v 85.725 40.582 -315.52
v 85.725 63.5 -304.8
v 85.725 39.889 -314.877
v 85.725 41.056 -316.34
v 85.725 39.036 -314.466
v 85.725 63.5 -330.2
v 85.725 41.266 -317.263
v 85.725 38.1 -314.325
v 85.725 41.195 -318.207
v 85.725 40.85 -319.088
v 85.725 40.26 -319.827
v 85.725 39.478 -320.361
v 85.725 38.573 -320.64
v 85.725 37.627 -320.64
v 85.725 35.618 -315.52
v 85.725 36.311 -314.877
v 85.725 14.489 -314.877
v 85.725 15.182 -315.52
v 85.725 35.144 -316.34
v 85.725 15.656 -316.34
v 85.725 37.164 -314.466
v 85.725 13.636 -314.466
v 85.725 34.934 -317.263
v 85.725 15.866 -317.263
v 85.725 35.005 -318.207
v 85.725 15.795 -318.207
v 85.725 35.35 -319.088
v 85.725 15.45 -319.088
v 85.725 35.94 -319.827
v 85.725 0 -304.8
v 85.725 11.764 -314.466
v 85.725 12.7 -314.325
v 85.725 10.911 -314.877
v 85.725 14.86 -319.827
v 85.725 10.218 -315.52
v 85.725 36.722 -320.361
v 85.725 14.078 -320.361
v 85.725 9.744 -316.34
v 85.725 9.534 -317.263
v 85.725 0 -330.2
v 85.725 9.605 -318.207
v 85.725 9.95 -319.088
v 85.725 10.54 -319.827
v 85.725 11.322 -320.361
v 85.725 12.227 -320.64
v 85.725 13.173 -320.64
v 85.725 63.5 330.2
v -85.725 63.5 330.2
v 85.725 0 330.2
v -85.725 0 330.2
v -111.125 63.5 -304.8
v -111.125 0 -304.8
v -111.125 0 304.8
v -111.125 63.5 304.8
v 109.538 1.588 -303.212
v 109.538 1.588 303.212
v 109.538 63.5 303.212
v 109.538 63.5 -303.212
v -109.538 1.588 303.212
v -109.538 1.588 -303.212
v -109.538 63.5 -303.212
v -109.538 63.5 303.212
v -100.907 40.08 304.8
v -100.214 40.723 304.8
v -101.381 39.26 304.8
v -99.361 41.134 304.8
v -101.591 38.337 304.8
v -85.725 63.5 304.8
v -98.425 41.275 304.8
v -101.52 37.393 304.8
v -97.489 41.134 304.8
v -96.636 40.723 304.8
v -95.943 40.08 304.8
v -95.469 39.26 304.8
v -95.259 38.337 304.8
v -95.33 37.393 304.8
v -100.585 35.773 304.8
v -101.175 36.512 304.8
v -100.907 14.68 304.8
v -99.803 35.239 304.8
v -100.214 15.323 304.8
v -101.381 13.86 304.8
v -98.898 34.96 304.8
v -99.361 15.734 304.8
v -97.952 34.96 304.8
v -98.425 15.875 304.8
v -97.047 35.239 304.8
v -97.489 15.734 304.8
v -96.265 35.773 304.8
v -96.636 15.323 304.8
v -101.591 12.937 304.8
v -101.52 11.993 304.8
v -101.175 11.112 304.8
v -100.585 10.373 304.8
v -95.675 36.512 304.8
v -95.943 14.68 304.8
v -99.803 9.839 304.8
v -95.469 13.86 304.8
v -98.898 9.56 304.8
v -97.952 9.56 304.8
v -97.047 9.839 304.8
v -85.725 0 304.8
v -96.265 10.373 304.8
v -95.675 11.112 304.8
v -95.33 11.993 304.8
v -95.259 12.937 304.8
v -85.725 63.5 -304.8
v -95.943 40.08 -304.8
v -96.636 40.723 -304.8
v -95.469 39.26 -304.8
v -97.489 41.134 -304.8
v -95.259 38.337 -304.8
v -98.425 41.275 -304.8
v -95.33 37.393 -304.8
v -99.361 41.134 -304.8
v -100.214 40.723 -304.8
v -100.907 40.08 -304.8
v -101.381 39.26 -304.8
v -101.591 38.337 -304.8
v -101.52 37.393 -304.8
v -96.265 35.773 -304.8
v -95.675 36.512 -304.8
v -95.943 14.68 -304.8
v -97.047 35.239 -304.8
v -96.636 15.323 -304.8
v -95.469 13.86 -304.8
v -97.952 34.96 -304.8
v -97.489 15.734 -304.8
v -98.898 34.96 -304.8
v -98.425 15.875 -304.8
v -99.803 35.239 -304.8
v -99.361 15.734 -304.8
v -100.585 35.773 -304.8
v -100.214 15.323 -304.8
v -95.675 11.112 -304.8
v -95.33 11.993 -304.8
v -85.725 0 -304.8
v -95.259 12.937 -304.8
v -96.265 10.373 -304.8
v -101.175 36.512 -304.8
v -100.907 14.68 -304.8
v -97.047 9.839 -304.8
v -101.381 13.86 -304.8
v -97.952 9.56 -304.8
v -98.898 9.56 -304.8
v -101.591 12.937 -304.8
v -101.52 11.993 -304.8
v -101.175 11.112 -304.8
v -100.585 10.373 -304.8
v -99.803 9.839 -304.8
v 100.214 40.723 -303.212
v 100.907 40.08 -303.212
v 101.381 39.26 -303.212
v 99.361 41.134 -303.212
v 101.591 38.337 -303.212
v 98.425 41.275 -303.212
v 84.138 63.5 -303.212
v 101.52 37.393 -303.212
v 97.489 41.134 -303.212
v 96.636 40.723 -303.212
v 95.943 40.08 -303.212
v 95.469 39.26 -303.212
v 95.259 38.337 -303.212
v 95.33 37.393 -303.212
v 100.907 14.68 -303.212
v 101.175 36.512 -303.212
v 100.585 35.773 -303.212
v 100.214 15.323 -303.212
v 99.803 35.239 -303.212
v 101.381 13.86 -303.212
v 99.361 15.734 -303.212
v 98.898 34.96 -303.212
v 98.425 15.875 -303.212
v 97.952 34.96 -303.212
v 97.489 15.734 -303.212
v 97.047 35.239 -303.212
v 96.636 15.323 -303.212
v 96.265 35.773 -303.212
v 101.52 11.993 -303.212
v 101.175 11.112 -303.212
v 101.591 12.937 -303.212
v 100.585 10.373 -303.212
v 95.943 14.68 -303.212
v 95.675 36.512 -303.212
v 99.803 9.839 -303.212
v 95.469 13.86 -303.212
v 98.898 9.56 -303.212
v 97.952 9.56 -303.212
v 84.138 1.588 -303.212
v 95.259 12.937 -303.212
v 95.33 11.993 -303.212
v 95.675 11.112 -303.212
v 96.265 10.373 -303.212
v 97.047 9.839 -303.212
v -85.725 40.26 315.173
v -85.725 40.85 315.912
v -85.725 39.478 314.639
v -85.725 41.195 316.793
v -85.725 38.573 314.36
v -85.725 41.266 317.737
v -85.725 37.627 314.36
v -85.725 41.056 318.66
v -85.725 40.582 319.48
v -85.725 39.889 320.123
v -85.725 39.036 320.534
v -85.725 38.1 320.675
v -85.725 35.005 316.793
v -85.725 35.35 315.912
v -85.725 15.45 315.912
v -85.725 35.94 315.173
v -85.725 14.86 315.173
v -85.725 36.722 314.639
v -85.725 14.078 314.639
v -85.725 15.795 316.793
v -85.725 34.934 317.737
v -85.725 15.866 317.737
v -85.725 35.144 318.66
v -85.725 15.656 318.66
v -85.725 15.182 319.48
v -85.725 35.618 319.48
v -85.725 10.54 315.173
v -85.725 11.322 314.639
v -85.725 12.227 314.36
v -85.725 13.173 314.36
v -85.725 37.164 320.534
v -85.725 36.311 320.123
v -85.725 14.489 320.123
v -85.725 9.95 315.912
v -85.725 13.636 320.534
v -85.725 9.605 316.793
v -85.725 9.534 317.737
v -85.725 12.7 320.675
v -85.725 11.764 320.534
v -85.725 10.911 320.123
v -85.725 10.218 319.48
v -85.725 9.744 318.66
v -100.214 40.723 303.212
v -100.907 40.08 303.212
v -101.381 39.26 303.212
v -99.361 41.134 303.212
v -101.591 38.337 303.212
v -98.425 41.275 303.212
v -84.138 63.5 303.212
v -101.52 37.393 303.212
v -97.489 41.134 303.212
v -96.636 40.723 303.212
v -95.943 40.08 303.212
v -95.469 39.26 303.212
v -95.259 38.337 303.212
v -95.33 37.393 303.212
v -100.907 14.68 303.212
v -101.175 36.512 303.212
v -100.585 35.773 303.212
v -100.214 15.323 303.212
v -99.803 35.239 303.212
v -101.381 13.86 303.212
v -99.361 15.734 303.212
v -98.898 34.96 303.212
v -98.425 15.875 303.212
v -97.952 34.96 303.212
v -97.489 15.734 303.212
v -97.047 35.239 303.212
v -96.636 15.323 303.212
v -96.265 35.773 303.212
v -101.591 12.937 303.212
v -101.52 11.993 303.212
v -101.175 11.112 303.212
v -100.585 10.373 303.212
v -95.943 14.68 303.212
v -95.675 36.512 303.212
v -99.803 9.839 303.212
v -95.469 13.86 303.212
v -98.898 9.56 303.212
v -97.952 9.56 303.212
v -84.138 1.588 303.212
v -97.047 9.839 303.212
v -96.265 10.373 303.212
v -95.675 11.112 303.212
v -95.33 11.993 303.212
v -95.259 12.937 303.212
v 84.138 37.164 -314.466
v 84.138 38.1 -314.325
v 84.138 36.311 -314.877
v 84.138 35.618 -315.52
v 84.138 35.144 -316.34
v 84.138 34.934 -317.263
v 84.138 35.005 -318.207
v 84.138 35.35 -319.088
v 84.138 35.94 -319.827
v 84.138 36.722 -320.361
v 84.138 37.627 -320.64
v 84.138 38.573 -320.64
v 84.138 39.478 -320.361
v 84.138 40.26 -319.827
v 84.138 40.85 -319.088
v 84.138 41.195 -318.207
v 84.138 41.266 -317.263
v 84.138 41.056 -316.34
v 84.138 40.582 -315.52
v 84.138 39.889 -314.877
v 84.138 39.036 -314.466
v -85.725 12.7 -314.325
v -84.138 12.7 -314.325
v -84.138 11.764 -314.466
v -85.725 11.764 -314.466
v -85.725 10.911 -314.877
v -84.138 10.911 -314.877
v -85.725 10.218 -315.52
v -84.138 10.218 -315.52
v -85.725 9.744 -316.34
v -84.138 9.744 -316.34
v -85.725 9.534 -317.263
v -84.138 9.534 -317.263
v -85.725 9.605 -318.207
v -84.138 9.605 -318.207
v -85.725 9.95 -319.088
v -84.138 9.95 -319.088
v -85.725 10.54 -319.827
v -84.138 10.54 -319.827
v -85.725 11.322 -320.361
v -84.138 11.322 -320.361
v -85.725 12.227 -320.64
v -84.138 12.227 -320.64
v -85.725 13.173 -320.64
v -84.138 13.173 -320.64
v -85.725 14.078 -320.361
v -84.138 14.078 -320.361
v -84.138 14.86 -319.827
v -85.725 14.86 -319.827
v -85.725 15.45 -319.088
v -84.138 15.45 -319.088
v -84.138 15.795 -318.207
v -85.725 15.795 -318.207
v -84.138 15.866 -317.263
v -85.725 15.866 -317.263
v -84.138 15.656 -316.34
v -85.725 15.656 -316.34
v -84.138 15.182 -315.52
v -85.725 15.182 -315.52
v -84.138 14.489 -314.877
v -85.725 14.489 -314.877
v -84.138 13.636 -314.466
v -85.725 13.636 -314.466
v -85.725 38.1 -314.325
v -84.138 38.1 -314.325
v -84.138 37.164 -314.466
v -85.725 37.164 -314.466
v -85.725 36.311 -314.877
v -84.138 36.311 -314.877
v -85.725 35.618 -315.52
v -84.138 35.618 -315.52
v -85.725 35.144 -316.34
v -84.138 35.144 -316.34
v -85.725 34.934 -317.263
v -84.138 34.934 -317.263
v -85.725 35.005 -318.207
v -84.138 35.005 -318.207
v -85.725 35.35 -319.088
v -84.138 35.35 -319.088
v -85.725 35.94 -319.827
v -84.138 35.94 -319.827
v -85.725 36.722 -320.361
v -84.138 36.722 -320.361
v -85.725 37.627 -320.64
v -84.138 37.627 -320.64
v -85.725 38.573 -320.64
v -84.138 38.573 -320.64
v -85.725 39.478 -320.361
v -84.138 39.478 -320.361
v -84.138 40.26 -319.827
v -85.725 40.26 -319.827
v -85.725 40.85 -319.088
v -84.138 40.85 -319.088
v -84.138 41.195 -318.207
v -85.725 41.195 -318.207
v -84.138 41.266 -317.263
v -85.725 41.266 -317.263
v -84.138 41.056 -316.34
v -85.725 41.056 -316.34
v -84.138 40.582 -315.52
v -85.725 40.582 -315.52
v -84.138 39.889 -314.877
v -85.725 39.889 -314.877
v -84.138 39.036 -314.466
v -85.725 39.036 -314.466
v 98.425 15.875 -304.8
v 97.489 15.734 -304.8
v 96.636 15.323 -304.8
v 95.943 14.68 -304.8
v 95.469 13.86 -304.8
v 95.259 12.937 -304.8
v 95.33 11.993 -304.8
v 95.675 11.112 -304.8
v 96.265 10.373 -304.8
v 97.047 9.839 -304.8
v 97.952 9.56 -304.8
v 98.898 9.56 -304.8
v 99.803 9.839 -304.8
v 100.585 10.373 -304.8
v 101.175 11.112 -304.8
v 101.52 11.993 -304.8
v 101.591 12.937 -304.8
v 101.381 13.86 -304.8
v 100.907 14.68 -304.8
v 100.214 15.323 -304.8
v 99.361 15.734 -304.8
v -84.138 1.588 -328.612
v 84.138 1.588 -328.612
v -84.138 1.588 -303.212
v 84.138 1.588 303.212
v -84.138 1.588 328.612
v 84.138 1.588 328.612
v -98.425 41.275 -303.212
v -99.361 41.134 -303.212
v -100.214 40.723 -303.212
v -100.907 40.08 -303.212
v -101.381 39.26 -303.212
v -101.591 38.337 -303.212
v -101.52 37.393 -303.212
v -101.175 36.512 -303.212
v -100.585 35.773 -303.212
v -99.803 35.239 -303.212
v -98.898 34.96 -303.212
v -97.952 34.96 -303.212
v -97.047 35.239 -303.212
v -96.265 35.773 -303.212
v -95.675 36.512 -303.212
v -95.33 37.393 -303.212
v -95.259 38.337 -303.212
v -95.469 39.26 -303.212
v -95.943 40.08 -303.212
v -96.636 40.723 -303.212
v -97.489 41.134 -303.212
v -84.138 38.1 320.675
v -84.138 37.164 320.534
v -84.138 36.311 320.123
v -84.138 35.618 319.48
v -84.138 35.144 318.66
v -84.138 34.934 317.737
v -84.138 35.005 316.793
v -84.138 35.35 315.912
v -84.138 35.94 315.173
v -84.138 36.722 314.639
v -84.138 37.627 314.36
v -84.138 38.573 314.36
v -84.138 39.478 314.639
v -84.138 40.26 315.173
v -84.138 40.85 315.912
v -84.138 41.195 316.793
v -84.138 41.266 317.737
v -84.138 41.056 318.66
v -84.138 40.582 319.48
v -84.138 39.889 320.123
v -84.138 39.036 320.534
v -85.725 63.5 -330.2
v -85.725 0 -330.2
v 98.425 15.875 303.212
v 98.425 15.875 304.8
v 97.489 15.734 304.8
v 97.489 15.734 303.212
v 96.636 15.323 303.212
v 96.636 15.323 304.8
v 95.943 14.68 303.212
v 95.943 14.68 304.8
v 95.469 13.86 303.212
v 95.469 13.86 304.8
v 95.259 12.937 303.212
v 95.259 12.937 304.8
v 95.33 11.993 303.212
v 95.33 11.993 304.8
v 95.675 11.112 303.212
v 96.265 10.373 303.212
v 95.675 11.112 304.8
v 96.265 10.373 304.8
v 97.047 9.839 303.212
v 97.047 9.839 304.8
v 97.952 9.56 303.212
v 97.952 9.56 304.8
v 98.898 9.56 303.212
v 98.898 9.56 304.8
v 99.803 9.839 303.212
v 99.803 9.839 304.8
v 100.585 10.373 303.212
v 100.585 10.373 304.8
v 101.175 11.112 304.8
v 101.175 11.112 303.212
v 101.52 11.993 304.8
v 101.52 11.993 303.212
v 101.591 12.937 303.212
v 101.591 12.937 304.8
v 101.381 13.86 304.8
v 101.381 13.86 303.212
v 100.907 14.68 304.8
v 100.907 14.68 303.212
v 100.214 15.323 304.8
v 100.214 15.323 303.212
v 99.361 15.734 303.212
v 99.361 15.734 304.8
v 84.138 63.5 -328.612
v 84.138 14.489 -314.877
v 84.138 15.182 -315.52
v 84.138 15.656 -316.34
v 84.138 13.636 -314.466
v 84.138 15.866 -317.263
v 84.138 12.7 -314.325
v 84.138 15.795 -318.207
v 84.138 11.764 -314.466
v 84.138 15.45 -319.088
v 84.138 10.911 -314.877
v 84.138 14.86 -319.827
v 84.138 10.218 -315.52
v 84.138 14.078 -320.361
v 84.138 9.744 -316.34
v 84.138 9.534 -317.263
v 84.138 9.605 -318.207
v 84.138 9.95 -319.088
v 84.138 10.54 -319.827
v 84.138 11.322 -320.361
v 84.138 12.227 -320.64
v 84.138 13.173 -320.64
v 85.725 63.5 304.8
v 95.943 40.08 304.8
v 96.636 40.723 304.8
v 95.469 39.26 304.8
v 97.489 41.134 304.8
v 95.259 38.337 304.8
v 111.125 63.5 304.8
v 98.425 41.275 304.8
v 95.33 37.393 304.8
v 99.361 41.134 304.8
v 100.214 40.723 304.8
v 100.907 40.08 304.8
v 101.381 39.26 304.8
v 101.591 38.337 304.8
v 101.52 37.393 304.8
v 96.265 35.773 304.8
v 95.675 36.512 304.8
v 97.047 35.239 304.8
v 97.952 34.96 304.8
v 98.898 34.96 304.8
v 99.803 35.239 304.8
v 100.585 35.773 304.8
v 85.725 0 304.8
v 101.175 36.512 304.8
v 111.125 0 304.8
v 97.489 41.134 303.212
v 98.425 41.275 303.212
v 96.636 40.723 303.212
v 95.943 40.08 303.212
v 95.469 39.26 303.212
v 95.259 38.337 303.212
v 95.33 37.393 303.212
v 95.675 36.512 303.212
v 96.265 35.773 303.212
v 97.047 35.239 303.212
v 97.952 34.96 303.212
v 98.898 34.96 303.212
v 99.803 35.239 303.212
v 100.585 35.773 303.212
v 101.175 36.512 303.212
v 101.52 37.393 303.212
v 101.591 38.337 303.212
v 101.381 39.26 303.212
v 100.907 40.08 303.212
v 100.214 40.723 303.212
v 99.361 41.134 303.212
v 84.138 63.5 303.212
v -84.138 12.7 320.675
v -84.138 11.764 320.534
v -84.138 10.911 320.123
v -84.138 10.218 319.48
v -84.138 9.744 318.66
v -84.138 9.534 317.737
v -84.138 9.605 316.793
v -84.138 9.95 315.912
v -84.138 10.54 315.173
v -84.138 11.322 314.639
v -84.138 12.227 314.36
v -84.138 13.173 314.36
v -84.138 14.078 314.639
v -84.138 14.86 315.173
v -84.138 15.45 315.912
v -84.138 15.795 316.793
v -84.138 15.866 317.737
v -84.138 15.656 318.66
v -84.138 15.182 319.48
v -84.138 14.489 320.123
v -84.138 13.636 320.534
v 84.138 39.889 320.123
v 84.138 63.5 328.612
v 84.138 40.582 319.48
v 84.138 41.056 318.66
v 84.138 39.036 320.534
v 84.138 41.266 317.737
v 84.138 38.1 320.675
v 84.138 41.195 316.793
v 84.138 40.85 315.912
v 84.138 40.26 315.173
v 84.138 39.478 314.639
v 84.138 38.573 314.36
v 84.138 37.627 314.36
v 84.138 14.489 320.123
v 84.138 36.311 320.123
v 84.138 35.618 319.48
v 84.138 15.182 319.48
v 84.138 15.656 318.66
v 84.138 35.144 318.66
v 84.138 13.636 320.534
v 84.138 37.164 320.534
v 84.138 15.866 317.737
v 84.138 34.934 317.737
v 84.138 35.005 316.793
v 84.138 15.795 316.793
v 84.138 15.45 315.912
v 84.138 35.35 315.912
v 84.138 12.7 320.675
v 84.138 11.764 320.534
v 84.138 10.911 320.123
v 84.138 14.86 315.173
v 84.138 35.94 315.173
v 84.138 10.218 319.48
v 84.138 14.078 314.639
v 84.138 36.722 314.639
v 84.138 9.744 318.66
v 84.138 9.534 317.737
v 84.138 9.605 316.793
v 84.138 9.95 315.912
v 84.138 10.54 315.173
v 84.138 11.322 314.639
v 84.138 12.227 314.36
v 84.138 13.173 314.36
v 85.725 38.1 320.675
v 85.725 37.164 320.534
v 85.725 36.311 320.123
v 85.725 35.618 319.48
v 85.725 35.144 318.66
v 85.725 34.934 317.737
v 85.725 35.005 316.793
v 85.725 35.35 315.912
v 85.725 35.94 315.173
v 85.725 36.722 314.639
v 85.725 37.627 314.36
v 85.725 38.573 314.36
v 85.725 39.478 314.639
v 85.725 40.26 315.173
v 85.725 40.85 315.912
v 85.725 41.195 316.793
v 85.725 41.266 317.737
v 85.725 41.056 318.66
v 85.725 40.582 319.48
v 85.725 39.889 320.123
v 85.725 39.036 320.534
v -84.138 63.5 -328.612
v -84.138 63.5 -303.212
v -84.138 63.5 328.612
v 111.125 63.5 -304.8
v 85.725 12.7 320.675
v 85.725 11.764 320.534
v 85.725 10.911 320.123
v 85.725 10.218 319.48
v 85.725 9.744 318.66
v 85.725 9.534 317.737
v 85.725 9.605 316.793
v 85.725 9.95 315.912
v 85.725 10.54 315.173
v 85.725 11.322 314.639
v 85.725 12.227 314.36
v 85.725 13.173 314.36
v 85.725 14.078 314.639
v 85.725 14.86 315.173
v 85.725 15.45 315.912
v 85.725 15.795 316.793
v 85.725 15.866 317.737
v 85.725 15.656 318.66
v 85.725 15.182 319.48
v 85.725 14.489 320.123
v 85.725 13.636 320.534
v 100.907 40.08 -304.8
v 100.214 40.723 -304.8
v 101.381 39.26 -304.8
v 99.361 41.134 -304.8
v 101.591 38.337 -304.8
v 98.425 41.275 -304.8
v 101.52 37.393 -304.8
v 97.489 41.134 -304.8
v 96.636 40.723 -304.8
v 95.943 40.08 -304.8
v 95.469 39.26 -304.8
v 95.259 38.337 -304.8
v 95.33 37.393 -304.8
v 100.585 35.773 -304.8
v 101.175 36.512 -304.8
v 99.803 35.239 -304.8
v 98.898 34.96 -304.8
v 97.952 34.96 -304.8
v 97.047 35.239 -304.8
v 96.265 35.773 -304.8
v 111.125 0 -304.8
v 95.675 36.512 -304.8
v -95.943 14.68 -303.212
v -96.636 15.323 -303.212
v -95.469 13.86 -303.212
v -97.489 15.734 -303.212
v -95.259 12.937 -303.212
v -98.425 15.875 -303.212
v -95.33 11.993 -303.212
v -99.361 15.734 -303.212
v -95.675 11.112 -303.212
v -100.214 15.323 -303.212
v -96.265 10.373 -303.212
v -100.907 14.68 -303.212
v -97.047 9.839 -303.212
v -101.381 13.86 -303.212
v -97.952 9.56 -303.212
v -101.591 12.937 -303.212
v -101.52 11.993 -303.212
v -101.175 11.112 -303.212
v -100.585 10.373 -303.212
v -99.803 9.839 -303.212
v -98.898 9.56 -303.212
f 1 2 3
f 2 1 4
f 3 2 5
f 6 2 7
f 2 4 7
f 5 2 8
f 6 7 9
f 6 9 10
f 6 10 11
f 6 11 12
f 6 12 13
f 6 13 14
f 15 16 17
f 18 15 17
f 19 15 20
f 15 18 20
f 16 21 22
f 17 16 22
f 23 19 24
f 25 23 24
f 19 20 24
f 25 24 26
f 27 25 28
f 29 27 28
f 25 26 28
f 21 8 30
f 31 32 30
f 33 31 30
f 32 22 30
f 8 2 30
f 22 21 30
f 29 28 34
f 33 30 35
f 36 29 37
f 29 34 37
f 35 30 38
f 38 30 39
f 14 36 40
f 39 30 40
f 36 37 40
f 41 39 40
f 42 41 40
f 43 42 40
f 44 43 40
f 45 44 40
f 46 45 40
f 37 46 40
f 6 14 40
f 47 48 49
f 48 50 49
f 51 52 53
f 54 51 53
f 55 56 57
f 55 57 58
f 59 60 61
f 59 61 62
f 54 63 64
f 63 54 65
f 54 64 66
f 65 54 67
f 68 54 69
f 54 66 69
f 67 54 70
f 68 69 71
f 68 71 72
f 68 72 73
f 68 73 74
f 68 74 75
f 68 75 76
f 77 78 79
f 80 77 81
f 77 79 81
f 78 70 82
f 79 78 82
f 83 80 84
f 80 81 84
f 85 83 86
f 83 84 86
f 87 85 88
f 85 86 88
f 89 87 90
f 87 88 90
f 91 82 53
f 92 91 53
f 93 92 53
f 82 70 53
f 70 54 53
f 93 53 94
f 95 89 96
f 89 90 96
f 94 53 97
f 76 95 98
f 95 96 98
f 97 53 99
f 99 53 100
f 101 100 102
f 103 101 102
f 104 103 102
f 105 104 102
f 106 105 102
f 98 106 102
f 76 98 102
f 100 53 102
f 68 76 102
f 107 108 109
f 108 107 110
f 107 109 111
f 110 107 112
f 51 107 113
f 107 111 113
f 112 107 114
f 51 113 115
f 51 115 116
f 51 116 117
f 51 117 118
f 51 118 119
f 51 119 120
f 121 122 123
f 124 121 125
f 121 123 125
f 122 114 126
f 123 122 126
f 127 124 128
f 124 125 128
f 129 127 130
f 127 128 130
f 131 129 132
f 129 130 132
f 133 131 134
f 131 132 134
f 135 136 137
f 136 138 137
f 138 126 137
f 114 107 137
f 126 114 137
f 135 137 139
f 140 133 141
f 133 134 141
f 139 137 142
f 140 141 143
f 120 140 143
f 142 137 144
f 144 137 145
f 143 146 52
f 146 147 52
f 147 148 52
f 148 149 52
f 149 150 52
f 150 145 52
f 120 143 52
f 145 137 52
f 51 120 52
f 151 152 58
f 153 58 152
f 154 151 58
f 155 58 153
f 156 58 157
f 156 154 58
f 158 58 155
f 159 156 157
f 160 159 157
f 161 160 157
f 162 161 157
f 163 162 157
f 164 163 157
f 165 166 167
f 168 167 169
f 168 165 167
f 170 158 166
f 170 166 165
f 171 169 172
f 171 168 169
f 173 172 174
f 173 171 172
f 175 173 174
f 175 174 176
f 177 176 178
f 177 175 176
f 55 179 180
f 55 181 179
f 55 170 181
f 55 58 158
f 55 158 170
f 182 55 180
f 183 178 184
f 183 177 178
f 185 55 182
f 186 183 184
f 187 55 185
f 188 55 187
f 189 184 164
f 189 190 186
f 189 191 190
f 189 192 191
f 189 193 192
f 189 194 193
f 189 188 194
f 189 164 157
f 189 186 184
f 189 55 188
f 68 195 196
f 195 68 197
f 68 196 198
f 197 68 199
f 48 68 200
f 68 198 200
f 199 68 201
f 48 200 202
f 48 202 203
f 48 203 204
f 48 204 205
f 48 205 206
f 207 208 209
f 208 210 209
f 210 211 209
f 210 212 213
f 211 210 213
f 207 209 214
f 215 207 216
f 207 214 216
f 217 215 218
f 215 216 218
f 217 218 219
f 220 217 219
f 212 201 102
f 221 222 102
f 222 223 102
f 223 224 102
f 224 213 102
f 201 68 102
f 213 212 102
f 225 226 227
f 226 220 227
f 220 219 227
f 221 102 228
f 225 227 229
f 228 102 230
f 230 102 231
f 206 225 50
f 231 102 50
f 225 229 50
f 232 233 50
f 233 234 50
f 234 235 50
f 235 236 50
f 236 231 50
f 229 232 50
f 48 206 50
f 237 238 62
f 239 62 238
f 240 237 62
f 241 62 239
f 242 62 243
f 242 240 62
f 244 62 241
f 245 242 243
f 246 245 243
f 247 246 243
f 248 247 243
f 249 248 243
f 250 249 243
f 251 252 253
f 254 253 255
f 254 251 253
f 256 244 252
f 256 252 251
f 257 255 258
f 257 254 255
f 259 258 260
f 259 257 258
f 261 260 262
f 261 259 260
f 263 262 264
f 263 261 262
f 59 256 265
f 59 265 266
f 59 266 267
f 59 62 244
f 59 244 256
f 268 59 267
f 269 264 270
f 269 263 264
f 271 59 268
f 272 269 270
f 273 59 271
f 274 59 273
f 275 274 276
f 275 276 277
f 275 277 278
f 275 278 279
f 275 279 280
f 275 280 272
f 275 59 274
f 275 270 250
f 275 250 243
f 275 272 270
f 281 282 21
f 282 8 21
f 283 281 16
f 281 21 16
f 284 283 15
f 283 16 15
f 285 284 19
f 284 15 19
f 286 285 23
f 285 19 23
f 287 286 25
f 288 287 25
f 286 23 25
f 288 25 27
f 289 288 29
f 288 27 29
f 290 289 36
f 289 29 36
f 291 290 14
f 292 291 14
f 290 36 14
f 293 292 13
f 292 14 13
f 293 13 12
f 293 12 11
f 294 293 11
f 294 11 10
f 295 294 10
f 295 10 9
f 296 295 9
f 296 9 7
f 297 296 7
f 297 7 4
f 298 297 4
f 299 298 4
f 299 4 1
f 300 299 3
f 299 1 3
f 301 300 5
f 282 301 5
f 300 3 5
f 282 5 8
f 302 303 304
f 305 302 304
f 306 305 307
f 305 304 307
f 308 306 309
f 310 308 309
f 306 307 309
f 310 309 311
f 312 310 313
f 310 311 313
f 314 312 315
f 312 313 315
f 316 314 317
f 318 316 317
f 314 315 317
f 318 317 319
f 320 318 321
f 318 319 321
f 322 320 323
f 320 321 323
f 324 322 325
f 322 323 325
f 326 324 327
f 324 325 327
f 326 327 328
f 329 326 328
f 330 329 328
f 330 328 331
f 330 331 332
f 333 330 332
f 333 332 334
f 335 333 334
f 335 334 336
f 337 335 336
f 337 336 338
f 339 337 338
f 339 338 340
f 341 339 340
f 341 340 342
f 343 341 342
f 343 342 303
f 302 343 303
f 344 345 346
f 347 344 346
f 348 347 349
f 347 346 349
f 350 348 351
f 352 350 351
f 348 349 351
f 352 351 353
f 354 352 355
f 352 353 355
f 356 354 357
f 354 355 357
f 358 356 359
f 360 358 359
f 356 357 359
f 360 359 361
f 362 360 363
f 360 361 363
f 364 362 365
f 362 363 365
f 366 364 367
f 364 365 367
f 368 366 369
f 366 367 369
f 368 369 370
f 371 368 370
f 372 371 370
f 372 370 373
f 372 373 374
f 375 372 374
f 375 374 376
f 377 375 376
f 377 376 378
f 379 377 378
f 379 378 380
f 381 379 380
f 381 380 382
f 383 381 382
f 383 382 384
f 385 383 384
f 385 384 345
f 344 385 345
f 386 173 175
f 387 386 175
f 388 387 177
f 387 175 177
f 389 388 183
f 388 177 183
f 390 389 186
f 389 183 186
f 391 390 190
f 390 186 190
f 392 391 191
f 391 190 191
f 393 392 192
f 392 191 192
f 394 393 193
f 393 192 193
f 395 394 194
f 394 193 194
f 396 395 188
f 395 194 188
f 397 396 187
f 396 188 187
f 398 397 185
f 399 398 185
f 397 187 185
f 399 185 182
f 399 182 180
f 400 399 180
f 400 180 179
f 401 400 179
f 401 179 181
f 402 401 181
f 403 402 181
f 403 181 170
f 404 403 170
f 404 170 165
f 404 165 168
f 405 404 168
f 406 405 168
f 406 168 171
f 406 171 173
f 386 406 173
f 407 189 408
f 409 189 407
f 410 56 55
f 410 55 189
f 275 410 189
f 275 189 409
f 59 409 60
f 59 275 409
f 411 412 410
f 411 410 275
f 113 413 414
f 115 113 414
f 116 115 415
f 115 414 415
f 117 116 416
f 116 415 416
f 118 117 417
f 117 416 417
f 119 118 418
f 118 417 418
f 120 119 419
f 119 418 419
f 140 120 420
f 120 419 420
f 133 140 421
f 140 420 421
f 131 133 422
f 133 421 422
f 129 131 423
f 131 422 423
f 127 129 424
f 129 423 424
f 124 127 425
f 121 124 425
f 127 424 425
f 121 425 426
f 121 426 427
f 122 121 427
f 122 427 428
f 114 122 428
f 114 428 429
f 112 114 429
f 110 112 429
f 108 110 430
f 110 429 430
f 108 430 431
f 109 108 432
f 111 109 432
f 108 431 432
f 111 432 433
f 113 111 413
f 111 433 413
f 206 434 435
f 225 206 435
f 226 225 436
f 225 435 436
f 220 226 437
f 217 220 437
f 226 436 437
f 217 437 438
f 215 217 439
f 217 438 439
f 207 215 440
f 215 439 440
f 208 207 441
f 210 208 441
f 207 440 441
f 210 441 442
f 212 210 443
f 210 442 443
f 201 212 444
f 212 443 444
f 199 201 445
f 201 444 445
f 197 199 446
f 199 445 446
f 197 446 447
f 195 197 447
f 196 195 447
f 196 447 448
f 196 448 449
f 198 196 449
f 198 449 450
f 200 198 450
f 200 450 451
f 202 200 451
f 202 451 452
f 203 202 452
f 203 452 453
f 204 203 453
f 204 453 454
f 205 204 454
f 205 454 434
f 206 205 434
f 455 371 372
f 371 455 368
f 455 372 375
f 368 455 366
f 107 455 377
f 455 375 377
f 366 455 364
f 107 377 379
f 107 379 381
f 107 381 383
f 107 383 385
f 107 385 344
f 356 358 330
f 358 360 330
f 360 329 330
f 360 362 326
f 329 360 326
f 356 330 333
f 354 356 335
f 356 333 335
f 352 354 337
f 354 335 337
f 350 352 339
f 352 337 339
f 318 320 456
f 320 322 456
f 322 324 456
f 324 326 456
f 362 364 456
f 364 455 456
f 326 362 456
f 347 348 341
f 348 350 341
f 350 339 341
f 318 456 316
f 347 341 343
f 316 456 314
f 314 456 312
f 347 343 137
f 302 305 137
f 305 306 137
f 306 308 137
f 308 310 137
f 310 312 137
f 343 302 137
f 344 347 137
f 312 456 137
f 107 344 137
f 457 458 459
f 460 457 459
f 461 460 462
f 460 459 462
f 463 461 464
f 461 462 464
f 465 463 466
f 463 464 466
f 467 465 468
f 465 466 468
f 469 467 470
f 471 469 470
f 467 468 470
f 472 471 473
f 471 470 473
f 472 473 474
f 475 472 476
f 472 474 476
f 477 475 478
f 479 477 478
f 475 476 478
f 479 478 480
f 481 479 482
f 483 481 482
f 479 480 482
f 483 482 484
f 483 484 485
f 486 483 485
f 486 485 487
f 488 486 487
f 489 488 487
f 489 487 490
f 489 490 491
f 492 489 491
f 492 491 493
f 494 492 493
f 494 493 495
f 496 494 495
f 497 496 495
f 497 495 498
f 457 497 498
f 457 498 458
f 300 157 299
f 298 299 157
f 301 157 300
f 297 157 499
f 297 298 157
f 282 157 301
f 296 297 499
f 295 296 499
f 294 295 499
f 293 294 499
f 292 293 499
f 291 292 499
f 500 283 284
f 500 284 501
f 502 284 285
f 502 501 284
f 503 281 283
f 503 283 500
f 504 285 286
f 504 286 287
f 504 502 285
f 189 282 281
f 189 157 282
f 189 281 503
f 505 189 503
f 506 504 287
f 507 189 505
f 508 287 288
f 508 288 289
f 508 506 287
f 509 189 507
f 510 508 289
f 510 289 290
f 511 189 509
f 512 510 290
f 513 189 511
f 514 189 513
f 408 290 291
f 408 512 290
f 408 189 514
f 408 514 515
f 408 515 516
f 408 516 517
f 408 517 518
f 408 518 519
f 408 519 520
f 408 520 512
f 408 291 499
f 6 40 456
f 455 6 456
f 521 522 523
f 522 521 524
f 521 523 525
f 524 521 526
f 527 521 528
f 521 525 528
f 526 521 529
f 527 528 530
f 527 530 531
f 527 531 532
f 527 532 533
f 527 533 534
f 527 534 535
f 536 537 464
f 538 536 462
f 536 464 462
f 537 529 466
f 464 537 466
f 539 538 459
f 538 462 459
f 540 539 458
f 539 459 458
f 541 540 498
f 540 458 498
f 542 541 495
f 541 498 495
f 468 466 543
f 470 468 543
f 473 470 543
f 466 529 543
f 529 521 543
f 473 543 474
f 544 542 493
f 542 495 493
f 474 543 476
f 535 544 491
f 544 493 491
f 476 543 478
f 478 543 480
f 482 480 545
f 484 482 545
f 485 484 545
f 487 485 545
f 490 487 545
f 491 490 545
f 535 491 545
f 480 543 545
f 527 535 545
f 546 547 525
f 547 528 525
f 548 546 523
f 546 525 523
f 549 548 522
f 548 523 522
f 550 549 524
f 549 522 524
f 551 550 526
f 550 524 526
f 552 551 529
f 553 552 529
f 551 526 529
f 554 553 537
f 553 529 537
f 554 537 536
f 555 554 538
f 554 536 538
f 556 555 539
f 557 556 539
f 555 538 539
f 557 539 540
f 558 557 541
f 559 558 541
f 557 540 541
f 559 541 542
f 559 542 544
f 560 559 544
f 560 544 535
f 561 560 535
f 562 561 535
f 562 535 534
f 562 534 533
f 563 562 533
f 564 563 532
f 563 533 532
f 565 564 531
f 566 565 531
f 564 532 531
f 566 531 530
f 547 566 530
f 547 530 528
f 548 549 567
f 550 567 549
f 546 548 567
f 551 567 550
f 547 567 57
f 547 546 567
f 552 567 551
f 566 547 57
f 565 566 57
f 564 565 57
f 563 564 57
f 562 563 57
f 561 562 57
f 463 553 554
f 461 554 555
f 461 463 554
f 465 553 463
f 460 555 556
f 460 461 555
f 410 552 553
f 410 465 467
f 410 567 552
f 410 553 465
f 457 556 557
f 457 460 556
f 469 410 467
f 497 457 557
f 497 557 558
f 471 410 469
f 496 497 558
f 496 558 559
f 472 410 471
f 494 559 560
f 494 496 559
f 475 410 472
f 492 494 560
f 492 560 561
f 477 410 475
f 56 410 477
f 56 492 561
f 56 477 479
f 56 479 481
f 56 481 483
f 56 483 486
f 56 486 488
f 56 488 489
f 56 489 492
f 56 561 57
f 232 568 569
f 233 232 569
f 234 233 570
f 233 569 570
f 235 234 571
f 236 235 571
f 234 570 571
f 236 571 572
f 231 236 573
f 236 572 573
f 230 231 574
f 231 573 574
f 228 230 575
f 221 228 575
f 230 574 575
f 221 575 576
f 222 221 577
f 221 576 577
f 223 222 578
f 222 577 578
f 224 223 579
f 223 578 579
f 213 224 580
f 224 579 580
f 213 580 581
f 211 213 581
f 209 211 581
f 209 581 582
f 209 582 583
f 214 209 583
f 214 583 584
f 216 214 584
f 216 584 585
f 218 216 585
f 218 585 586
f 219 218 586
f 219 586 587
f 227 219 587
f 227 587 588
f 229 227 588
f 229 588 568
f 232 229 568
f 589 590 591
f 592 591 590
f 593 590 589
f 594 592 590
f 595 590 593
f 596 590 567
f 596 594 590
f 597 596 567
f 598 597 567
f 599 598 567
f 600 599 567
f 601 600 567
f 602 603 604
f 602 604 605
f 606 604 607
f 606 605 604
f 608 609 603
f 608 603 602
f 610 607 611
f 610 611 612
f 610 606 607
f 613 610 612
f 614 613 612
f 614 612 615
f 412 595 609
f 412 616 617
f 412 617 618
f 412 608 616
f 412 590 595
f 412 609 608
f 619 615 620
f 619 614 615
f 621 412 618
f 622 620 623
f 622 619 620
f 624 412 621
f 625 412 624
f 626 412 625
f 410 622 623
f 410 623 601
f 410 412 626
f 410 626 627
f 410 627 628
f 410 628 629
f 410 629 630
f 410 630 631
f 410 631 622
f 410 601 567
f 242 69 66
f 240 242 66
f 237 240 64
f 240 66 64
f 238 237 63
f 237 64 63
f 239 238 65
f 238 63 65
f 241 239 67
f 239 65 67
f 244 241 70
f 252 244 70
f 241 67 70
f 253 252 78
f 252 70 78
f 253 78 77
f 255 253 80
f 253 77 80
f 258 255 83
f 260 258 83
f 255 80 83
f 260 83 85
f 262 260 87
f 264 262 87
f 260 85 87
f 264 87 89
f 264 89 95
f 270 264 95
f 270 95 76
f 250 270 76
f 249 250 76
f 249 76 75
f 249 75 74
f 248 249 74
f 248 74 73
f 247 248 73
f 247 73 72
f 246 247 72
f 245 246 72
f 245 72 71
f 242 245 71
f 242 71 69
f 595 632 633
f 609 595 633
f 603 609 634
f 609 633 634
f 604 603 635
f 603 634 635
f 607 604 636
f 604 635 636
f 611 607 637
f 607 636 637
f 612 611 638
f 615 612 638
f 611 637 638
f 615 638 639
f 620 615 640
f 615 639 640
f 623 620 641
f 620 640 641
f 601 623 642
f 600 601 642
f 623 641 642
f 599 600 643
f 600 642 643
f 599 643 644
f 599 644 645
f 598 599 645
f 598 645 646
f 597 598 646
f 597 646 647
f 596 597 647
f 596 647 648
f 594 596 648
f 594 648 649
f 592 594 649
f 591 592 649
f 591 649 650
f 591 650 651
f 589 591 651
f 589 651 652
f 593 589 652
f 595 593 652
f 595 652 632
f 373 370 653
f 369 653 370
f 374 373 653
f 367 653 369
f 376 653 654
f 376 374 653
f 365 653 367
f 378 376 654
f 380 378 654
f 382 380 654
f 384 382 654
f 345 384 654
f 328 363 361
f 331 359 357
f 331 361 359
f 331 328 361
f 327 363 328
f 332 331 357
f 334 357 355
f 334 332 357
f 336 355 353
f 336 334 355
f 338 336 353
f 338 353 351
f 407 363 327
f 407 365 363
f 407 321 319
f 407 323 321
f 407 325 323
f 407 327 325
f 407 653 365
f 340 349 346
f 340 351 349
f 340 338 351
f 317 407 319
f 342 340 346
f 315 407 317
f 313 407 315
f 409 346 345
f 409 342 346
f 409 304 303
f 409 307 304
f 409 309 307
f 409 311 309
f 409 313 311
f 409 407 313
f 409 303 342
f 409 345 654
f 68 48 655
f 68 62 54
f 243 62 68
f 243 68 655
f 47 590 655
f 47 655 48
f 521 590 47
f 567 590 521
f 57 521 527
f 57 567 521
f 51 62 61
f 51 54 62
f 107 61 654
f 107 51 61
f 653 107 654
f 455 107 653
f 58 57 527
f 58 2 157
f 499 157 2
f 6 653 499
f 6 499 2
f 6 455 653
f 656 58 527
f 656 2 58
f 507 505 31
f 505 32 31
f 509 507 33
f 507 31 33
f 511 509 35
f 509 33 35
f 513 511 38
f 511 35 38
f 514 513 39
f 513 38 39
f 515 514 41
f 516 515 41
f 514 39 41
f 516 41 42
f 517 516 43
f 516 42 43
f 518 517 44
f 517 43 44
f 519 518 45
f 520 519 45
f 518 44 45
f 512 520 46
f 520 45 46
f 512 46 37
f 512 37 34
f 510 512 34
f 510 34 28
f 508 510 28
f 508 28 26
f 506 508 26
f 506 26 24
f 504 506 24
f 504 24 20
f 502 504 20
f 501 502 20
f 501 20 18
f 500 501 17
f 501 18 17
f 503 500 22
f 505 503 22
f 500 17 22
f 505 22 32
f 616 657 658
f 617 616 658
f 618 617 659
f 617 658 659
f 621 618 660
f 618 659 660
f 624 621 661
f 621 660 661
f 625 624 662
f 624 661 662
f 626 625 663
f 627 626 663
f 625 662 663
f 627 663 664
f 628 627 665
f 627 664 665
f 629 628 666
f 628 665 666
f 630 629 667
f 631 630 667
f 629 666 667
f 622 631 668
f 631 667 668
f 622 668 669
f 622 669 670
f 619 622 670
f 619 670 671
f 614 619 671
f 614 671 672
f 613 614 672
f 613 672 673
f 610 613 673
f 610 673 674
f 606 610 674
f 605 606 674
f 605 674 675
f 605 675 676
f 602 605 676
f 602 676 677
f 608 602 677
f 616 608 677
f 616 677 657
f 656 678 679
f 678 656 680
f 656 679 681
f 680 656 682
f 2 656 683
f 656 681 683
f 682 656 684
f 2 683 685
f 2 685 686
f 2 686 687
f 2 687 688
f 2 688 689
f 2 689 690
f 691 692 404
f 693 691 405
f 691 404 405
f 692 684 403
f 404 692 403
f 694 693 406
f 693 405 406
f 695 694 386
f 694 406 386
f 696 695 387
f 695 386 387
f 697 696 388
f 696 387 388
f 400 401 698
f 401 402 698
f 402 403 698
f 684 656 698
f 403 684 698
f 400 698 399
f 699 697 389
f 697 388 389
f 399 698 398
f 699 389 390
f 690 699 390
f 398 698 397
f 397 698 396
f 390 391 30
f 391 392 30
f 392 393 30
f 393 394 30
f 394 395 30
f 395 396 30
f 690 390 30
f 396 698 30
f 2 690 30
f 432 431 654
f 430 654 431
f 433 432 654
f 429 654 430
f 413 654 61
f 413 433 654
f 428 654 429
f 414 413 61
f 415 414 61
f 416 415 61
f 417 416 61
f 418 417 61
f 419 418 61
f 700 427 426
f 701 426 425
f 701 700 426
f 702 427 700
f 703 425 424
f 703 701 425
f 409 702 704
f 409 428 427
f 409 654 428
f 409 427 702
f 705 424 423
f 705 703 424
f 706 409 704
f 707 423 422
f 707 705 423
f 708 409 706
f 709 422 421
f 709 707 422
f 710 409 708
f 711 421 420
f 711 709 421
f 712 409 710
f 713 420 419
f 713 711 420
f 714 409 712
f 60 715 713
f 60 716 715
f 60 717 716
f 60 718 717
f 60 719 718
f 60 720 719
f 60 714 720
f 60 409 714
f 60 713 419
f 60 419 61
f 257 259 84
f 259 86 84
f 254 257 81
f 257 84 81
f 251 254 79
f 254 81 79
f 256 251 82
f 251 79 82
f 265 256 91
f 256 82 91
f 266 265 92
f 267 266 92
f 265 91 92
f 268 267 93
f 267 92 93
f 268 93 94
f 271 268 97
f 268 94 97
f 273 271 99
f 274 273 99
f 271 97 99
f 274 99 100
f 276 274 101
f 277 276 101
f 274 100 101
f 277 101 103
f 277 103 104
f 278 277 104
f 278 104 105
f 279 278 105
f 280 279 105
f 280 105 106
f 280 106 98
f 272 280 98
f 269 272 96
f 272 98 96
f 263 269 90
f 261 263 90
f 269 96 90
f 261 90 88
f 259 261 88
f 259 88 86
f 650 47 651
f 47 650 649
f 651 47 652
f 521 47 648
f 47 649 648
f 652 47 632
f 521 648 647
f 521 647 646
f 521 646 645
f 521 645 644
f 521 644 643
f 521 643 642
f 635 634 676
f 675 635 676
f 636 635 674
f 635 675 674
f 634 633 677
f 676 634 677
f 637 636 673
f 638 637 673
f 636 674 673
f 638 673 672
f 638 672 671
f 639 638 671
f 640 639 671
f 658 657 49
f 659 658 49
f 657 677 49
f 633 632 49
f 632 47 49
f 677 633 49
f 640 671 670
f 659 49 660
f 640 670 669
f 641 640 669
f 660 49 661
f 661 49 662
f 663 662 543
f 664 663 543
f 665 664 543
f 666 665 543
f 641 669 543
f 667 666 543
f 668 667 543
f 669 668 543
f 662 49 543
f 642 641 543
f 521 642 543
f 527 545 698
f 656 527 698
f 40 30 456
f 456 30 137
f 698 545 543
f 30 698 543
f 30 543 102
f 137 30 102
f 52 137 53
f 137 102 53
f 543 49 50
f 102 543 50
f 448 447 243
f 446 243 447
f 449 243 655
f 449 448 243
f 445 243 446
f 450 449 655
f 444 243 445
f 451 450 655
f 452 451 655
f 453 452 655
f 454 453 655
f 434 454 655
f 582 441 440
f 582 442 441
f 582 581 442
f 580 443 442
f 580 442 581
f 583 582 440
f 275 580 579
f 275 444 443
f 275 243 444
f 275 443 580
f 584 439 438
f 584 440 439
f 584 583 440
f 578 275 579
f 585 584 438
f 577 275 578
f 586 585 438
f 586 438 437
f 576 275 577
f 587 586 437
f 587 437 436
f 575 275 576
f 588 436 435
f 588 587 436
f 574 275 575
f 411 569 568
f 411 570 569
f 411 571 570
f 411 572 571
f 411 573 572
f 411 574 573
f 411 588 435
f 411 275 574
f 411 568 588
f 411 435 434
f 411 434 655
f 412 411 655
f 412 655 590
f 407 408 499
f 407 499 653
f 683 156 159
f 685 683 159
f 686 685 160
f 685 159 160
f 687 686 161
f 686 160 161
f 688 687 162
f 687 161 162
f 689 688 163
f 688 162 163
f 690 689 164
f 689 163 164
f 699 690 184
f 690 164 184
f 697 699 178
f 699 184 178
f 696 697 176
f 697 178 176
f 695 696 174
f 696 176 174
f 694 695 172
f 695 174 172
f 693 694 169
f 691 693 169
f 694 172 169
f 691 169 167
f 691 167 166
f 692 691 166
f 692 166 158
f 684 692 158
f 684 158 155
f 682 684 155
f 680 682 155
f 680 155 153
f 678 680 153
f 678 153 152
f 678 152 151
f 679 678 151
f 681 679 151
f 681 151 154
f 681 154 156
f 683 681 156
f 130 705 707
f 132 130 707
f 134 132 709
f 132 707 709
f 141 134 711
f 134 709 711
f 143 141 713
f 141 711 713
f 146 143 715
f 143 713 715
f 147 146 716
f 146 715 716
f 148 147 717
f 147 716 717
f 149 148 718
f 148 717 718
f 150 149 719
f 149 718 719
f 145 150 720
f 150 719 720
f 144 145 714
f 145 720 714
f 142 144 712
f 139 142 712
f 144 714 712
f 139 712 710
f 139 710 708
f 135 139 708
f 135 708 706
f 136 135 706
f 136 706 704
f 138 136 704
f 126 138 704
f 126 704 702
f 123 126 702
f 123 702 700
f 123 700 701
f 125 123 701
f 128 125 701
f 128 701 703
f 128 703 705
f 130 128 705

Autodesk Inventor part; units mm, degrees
ref_plane "YZ Plane" through (0, 0, 0) normal (1, 0, 0) x (0, 1, 0)
ref_plane "XZ Plane" through (0, 0, 0) normal (0, 1, 0) x (-1, 0, 0)
ref_plane "XY Plane" through (0, 0, 0) normal (0, 0, 1) x (1, 0, 0)
sketch "Electronics box bottom layout" plane through (0, 0, 0) normal (0, 1, 0) x (-1, 0, 0)
  line L0 (-111.125, 304.8) -> (111.125, 304.8)
  line L1 (111.125, 304.8) -> (111.125, -304.8)
  line L2 (111.125, -304.8) -> (-111.125, -304.8)
  line L3 (-111.125, -304.8) -> (-111.125, 304.8)
  line L4 (-111.125, 304.8) -> (111.125, -304.8) construction
  line L5 (111.125, 304.8) -> (-111.125, -304.8) construction
  line L6 (-85.725, 304.8) -> (85.725, 304.8)
  line L7 (85.725, 304.8) -> (85.725, 330.2)
  line L8 (85.725, 330.2) -> (-85.725, 330.2)
  line L9 (-85.725, 330.2) -> (-85.725, 304.8)
  line L10 (-85.725, 304.8) -> (85.725, 330.2) construction
  line L11 (85.725, 304.8) -> (-85.725, 330.2) construction
  line L12 (85.725, -304.8) -> (-85.725, -304.8)
  line L13 (-85.725, -304.8) -> (-85.725, -330.2)
  line L14 (-85.725, -330.2) -> (85.725, -330.2)
  line L15 (85.725, -330.2) -> (85.725, -304.8)
  line L16 (85.725, -304.8) -> (-85.725, -330.2) construction
  line L17 (-85.725, -304.8) -> (85.725, -330.2) construction
  point P0 (0, 0)
  point P1 (0, 317.5)
  point P2 (0, -317.5)
  point P3 (-85.725, 304.8)
  dimension "d0" = 222.25
  dimension "d1" = 609.6
  dimension "d2" = 171.45
  dimension "d3" = 171.45
  dimension "d4" = 25.4
  dimension "d5" = 25.4
extrude "Base" add sketch "Electronics box bottom layout" along normal blind 1.5875
sketch "Sketch2" plane through (0, 1.5875, 0) normal (0, 1, 0) x (1, 0, 0)
  line L0 (-111.125, -304.8) -> (-85.725, -304.8) projected
  line L1 (-85.725, -304.8) -> (-85.725, -330.2) projected
  line L2 (-85.725, -330.2) -> (85.725, -330.2) projected
  line L3 (85.725, -330.2) -> (85.725, -304.8) projected
  line L4 (85.725, -304.8) -> (111.125, -304.8) projected
  line L5 (111.125, -304.8) -> (111.125, 304.8) projected
  line L6 (111.125, 304.8) -> (85.725, 304.8) projected
  line L7 (85.725, 304.8) -> (85.725, 330.2) projected
  line L8 (85.725, 330.2) -> (-85.725, 330.2) projected
  line L9 (-85.725, 330.2) -> (-85.725, 304.8) projected
  line L10 (-85.725, 304.8) -> (-111.125, 304.8) projected
  line L11 (-111.125, 304.8) -> (-111.125, -304.8) projected
  line L12 (-109.5375, -303.2125) -> (-84.1375, -303.2125)
  line L13 (-84.1375, -303.2125) -> (-84.1375, -328.6125)
  line L14 (-84.1375, -328.6125) -> (84.1375, -328.6125)
  line L15 (84.1375, -328.6125) -> (84.1375, -303.2125)
  line L16 (84.1375, -303.2125) -> (109.5375, -303.2125)
  line L17 (109.5375, -303.2125) -> (109.5375, 303.2125)
  line L18 (109.5375, 303.2125) -> (84.1375, 303.2125)
  line L19 (84.1375, 303.2125) -> (84.1375, 328.6125)
  line L20 (84.1375, 328.6125) -> (-84.1375, 328.6125)
  line L21 (-84.1375, 328.6125) -> (-84.1375, 303.2125)
  line L22 (-84.1375, 303.2125) -> (-109.5375, 303.2125)
  line L23 (-109.5375, 303.2125) -> (-109.5375, -303.2125)
  point P0 (0, 0)
  dimension "d8" = 1.5875
extrude "Walls" add sketch "Sketch2" along normal blind 61.9125
sketch "Sketch3" plane through (-85.725, 0, -330.2) normal (-1, 0, 0) x (0, 0, 1)
  line L0 (0, 63.5) -> (25.4, 63.5) projected
  line L1 (0, 0) -> (25.4, 0) projected
  line L2 (0, 0) -> (0, 63.5) projected
  point P0 (330.2, 0)
  point P1 (12.7, 38.1)
  point P2 (12.7, 12.7)
  dimension "d11" = 25.4
  dimension "d12" = 12.7
  dimension "d31" = 12.7
  dimension "d32" = 12.7
hole "Hole1" at (-85.725, 38.1, -317.5) at (-85.725, 12.7, -317.5) direction (1, 0, 0) diameter 6.35 end through all
sketch "Sketch4" plane through (-85.725, 0, -304.8) normal (0, 0, -1) x (-1, 0, 0)
  line L0 (0, 63.5) -> (25.4, 63.5) projected
  line L1 (25.4, 0) -> (25.4, 63.5) projected
  line L2 (0, 0) -> (25.4, 0) projected
  point P0 (-85.725, 0)
  point P1 (12.7, 38.1)
  point P2 (12.7, 12.7)
  dimension "d20" = 25.4
  dimension "d21" = 12.7
  dimension "d22" = 12.7
  dimension "d23" = 12.7
hole "Hole2" at (-98.425, 38.1, -304.8) at (-98.425, 12.7, -304.8) direction (0, 0, 1) diameter 6.35 end through all
pattern_linear "Rectangular Pattern1" count 2 spacing 635 along (0, 0, 1) of "Hole1"
pattern_linear "Rectangular Pattern2" count 2 spacing 196.85 along (1, 0, 0) of "Hole2"
equation "\"d2\" = d0 - 2 * d4"
equation "\"d3\" = d2"
equation "\"d5\" = d4"
equation "\"d32\" = d31"
properties part number "EBox-Frame" material "Air"
